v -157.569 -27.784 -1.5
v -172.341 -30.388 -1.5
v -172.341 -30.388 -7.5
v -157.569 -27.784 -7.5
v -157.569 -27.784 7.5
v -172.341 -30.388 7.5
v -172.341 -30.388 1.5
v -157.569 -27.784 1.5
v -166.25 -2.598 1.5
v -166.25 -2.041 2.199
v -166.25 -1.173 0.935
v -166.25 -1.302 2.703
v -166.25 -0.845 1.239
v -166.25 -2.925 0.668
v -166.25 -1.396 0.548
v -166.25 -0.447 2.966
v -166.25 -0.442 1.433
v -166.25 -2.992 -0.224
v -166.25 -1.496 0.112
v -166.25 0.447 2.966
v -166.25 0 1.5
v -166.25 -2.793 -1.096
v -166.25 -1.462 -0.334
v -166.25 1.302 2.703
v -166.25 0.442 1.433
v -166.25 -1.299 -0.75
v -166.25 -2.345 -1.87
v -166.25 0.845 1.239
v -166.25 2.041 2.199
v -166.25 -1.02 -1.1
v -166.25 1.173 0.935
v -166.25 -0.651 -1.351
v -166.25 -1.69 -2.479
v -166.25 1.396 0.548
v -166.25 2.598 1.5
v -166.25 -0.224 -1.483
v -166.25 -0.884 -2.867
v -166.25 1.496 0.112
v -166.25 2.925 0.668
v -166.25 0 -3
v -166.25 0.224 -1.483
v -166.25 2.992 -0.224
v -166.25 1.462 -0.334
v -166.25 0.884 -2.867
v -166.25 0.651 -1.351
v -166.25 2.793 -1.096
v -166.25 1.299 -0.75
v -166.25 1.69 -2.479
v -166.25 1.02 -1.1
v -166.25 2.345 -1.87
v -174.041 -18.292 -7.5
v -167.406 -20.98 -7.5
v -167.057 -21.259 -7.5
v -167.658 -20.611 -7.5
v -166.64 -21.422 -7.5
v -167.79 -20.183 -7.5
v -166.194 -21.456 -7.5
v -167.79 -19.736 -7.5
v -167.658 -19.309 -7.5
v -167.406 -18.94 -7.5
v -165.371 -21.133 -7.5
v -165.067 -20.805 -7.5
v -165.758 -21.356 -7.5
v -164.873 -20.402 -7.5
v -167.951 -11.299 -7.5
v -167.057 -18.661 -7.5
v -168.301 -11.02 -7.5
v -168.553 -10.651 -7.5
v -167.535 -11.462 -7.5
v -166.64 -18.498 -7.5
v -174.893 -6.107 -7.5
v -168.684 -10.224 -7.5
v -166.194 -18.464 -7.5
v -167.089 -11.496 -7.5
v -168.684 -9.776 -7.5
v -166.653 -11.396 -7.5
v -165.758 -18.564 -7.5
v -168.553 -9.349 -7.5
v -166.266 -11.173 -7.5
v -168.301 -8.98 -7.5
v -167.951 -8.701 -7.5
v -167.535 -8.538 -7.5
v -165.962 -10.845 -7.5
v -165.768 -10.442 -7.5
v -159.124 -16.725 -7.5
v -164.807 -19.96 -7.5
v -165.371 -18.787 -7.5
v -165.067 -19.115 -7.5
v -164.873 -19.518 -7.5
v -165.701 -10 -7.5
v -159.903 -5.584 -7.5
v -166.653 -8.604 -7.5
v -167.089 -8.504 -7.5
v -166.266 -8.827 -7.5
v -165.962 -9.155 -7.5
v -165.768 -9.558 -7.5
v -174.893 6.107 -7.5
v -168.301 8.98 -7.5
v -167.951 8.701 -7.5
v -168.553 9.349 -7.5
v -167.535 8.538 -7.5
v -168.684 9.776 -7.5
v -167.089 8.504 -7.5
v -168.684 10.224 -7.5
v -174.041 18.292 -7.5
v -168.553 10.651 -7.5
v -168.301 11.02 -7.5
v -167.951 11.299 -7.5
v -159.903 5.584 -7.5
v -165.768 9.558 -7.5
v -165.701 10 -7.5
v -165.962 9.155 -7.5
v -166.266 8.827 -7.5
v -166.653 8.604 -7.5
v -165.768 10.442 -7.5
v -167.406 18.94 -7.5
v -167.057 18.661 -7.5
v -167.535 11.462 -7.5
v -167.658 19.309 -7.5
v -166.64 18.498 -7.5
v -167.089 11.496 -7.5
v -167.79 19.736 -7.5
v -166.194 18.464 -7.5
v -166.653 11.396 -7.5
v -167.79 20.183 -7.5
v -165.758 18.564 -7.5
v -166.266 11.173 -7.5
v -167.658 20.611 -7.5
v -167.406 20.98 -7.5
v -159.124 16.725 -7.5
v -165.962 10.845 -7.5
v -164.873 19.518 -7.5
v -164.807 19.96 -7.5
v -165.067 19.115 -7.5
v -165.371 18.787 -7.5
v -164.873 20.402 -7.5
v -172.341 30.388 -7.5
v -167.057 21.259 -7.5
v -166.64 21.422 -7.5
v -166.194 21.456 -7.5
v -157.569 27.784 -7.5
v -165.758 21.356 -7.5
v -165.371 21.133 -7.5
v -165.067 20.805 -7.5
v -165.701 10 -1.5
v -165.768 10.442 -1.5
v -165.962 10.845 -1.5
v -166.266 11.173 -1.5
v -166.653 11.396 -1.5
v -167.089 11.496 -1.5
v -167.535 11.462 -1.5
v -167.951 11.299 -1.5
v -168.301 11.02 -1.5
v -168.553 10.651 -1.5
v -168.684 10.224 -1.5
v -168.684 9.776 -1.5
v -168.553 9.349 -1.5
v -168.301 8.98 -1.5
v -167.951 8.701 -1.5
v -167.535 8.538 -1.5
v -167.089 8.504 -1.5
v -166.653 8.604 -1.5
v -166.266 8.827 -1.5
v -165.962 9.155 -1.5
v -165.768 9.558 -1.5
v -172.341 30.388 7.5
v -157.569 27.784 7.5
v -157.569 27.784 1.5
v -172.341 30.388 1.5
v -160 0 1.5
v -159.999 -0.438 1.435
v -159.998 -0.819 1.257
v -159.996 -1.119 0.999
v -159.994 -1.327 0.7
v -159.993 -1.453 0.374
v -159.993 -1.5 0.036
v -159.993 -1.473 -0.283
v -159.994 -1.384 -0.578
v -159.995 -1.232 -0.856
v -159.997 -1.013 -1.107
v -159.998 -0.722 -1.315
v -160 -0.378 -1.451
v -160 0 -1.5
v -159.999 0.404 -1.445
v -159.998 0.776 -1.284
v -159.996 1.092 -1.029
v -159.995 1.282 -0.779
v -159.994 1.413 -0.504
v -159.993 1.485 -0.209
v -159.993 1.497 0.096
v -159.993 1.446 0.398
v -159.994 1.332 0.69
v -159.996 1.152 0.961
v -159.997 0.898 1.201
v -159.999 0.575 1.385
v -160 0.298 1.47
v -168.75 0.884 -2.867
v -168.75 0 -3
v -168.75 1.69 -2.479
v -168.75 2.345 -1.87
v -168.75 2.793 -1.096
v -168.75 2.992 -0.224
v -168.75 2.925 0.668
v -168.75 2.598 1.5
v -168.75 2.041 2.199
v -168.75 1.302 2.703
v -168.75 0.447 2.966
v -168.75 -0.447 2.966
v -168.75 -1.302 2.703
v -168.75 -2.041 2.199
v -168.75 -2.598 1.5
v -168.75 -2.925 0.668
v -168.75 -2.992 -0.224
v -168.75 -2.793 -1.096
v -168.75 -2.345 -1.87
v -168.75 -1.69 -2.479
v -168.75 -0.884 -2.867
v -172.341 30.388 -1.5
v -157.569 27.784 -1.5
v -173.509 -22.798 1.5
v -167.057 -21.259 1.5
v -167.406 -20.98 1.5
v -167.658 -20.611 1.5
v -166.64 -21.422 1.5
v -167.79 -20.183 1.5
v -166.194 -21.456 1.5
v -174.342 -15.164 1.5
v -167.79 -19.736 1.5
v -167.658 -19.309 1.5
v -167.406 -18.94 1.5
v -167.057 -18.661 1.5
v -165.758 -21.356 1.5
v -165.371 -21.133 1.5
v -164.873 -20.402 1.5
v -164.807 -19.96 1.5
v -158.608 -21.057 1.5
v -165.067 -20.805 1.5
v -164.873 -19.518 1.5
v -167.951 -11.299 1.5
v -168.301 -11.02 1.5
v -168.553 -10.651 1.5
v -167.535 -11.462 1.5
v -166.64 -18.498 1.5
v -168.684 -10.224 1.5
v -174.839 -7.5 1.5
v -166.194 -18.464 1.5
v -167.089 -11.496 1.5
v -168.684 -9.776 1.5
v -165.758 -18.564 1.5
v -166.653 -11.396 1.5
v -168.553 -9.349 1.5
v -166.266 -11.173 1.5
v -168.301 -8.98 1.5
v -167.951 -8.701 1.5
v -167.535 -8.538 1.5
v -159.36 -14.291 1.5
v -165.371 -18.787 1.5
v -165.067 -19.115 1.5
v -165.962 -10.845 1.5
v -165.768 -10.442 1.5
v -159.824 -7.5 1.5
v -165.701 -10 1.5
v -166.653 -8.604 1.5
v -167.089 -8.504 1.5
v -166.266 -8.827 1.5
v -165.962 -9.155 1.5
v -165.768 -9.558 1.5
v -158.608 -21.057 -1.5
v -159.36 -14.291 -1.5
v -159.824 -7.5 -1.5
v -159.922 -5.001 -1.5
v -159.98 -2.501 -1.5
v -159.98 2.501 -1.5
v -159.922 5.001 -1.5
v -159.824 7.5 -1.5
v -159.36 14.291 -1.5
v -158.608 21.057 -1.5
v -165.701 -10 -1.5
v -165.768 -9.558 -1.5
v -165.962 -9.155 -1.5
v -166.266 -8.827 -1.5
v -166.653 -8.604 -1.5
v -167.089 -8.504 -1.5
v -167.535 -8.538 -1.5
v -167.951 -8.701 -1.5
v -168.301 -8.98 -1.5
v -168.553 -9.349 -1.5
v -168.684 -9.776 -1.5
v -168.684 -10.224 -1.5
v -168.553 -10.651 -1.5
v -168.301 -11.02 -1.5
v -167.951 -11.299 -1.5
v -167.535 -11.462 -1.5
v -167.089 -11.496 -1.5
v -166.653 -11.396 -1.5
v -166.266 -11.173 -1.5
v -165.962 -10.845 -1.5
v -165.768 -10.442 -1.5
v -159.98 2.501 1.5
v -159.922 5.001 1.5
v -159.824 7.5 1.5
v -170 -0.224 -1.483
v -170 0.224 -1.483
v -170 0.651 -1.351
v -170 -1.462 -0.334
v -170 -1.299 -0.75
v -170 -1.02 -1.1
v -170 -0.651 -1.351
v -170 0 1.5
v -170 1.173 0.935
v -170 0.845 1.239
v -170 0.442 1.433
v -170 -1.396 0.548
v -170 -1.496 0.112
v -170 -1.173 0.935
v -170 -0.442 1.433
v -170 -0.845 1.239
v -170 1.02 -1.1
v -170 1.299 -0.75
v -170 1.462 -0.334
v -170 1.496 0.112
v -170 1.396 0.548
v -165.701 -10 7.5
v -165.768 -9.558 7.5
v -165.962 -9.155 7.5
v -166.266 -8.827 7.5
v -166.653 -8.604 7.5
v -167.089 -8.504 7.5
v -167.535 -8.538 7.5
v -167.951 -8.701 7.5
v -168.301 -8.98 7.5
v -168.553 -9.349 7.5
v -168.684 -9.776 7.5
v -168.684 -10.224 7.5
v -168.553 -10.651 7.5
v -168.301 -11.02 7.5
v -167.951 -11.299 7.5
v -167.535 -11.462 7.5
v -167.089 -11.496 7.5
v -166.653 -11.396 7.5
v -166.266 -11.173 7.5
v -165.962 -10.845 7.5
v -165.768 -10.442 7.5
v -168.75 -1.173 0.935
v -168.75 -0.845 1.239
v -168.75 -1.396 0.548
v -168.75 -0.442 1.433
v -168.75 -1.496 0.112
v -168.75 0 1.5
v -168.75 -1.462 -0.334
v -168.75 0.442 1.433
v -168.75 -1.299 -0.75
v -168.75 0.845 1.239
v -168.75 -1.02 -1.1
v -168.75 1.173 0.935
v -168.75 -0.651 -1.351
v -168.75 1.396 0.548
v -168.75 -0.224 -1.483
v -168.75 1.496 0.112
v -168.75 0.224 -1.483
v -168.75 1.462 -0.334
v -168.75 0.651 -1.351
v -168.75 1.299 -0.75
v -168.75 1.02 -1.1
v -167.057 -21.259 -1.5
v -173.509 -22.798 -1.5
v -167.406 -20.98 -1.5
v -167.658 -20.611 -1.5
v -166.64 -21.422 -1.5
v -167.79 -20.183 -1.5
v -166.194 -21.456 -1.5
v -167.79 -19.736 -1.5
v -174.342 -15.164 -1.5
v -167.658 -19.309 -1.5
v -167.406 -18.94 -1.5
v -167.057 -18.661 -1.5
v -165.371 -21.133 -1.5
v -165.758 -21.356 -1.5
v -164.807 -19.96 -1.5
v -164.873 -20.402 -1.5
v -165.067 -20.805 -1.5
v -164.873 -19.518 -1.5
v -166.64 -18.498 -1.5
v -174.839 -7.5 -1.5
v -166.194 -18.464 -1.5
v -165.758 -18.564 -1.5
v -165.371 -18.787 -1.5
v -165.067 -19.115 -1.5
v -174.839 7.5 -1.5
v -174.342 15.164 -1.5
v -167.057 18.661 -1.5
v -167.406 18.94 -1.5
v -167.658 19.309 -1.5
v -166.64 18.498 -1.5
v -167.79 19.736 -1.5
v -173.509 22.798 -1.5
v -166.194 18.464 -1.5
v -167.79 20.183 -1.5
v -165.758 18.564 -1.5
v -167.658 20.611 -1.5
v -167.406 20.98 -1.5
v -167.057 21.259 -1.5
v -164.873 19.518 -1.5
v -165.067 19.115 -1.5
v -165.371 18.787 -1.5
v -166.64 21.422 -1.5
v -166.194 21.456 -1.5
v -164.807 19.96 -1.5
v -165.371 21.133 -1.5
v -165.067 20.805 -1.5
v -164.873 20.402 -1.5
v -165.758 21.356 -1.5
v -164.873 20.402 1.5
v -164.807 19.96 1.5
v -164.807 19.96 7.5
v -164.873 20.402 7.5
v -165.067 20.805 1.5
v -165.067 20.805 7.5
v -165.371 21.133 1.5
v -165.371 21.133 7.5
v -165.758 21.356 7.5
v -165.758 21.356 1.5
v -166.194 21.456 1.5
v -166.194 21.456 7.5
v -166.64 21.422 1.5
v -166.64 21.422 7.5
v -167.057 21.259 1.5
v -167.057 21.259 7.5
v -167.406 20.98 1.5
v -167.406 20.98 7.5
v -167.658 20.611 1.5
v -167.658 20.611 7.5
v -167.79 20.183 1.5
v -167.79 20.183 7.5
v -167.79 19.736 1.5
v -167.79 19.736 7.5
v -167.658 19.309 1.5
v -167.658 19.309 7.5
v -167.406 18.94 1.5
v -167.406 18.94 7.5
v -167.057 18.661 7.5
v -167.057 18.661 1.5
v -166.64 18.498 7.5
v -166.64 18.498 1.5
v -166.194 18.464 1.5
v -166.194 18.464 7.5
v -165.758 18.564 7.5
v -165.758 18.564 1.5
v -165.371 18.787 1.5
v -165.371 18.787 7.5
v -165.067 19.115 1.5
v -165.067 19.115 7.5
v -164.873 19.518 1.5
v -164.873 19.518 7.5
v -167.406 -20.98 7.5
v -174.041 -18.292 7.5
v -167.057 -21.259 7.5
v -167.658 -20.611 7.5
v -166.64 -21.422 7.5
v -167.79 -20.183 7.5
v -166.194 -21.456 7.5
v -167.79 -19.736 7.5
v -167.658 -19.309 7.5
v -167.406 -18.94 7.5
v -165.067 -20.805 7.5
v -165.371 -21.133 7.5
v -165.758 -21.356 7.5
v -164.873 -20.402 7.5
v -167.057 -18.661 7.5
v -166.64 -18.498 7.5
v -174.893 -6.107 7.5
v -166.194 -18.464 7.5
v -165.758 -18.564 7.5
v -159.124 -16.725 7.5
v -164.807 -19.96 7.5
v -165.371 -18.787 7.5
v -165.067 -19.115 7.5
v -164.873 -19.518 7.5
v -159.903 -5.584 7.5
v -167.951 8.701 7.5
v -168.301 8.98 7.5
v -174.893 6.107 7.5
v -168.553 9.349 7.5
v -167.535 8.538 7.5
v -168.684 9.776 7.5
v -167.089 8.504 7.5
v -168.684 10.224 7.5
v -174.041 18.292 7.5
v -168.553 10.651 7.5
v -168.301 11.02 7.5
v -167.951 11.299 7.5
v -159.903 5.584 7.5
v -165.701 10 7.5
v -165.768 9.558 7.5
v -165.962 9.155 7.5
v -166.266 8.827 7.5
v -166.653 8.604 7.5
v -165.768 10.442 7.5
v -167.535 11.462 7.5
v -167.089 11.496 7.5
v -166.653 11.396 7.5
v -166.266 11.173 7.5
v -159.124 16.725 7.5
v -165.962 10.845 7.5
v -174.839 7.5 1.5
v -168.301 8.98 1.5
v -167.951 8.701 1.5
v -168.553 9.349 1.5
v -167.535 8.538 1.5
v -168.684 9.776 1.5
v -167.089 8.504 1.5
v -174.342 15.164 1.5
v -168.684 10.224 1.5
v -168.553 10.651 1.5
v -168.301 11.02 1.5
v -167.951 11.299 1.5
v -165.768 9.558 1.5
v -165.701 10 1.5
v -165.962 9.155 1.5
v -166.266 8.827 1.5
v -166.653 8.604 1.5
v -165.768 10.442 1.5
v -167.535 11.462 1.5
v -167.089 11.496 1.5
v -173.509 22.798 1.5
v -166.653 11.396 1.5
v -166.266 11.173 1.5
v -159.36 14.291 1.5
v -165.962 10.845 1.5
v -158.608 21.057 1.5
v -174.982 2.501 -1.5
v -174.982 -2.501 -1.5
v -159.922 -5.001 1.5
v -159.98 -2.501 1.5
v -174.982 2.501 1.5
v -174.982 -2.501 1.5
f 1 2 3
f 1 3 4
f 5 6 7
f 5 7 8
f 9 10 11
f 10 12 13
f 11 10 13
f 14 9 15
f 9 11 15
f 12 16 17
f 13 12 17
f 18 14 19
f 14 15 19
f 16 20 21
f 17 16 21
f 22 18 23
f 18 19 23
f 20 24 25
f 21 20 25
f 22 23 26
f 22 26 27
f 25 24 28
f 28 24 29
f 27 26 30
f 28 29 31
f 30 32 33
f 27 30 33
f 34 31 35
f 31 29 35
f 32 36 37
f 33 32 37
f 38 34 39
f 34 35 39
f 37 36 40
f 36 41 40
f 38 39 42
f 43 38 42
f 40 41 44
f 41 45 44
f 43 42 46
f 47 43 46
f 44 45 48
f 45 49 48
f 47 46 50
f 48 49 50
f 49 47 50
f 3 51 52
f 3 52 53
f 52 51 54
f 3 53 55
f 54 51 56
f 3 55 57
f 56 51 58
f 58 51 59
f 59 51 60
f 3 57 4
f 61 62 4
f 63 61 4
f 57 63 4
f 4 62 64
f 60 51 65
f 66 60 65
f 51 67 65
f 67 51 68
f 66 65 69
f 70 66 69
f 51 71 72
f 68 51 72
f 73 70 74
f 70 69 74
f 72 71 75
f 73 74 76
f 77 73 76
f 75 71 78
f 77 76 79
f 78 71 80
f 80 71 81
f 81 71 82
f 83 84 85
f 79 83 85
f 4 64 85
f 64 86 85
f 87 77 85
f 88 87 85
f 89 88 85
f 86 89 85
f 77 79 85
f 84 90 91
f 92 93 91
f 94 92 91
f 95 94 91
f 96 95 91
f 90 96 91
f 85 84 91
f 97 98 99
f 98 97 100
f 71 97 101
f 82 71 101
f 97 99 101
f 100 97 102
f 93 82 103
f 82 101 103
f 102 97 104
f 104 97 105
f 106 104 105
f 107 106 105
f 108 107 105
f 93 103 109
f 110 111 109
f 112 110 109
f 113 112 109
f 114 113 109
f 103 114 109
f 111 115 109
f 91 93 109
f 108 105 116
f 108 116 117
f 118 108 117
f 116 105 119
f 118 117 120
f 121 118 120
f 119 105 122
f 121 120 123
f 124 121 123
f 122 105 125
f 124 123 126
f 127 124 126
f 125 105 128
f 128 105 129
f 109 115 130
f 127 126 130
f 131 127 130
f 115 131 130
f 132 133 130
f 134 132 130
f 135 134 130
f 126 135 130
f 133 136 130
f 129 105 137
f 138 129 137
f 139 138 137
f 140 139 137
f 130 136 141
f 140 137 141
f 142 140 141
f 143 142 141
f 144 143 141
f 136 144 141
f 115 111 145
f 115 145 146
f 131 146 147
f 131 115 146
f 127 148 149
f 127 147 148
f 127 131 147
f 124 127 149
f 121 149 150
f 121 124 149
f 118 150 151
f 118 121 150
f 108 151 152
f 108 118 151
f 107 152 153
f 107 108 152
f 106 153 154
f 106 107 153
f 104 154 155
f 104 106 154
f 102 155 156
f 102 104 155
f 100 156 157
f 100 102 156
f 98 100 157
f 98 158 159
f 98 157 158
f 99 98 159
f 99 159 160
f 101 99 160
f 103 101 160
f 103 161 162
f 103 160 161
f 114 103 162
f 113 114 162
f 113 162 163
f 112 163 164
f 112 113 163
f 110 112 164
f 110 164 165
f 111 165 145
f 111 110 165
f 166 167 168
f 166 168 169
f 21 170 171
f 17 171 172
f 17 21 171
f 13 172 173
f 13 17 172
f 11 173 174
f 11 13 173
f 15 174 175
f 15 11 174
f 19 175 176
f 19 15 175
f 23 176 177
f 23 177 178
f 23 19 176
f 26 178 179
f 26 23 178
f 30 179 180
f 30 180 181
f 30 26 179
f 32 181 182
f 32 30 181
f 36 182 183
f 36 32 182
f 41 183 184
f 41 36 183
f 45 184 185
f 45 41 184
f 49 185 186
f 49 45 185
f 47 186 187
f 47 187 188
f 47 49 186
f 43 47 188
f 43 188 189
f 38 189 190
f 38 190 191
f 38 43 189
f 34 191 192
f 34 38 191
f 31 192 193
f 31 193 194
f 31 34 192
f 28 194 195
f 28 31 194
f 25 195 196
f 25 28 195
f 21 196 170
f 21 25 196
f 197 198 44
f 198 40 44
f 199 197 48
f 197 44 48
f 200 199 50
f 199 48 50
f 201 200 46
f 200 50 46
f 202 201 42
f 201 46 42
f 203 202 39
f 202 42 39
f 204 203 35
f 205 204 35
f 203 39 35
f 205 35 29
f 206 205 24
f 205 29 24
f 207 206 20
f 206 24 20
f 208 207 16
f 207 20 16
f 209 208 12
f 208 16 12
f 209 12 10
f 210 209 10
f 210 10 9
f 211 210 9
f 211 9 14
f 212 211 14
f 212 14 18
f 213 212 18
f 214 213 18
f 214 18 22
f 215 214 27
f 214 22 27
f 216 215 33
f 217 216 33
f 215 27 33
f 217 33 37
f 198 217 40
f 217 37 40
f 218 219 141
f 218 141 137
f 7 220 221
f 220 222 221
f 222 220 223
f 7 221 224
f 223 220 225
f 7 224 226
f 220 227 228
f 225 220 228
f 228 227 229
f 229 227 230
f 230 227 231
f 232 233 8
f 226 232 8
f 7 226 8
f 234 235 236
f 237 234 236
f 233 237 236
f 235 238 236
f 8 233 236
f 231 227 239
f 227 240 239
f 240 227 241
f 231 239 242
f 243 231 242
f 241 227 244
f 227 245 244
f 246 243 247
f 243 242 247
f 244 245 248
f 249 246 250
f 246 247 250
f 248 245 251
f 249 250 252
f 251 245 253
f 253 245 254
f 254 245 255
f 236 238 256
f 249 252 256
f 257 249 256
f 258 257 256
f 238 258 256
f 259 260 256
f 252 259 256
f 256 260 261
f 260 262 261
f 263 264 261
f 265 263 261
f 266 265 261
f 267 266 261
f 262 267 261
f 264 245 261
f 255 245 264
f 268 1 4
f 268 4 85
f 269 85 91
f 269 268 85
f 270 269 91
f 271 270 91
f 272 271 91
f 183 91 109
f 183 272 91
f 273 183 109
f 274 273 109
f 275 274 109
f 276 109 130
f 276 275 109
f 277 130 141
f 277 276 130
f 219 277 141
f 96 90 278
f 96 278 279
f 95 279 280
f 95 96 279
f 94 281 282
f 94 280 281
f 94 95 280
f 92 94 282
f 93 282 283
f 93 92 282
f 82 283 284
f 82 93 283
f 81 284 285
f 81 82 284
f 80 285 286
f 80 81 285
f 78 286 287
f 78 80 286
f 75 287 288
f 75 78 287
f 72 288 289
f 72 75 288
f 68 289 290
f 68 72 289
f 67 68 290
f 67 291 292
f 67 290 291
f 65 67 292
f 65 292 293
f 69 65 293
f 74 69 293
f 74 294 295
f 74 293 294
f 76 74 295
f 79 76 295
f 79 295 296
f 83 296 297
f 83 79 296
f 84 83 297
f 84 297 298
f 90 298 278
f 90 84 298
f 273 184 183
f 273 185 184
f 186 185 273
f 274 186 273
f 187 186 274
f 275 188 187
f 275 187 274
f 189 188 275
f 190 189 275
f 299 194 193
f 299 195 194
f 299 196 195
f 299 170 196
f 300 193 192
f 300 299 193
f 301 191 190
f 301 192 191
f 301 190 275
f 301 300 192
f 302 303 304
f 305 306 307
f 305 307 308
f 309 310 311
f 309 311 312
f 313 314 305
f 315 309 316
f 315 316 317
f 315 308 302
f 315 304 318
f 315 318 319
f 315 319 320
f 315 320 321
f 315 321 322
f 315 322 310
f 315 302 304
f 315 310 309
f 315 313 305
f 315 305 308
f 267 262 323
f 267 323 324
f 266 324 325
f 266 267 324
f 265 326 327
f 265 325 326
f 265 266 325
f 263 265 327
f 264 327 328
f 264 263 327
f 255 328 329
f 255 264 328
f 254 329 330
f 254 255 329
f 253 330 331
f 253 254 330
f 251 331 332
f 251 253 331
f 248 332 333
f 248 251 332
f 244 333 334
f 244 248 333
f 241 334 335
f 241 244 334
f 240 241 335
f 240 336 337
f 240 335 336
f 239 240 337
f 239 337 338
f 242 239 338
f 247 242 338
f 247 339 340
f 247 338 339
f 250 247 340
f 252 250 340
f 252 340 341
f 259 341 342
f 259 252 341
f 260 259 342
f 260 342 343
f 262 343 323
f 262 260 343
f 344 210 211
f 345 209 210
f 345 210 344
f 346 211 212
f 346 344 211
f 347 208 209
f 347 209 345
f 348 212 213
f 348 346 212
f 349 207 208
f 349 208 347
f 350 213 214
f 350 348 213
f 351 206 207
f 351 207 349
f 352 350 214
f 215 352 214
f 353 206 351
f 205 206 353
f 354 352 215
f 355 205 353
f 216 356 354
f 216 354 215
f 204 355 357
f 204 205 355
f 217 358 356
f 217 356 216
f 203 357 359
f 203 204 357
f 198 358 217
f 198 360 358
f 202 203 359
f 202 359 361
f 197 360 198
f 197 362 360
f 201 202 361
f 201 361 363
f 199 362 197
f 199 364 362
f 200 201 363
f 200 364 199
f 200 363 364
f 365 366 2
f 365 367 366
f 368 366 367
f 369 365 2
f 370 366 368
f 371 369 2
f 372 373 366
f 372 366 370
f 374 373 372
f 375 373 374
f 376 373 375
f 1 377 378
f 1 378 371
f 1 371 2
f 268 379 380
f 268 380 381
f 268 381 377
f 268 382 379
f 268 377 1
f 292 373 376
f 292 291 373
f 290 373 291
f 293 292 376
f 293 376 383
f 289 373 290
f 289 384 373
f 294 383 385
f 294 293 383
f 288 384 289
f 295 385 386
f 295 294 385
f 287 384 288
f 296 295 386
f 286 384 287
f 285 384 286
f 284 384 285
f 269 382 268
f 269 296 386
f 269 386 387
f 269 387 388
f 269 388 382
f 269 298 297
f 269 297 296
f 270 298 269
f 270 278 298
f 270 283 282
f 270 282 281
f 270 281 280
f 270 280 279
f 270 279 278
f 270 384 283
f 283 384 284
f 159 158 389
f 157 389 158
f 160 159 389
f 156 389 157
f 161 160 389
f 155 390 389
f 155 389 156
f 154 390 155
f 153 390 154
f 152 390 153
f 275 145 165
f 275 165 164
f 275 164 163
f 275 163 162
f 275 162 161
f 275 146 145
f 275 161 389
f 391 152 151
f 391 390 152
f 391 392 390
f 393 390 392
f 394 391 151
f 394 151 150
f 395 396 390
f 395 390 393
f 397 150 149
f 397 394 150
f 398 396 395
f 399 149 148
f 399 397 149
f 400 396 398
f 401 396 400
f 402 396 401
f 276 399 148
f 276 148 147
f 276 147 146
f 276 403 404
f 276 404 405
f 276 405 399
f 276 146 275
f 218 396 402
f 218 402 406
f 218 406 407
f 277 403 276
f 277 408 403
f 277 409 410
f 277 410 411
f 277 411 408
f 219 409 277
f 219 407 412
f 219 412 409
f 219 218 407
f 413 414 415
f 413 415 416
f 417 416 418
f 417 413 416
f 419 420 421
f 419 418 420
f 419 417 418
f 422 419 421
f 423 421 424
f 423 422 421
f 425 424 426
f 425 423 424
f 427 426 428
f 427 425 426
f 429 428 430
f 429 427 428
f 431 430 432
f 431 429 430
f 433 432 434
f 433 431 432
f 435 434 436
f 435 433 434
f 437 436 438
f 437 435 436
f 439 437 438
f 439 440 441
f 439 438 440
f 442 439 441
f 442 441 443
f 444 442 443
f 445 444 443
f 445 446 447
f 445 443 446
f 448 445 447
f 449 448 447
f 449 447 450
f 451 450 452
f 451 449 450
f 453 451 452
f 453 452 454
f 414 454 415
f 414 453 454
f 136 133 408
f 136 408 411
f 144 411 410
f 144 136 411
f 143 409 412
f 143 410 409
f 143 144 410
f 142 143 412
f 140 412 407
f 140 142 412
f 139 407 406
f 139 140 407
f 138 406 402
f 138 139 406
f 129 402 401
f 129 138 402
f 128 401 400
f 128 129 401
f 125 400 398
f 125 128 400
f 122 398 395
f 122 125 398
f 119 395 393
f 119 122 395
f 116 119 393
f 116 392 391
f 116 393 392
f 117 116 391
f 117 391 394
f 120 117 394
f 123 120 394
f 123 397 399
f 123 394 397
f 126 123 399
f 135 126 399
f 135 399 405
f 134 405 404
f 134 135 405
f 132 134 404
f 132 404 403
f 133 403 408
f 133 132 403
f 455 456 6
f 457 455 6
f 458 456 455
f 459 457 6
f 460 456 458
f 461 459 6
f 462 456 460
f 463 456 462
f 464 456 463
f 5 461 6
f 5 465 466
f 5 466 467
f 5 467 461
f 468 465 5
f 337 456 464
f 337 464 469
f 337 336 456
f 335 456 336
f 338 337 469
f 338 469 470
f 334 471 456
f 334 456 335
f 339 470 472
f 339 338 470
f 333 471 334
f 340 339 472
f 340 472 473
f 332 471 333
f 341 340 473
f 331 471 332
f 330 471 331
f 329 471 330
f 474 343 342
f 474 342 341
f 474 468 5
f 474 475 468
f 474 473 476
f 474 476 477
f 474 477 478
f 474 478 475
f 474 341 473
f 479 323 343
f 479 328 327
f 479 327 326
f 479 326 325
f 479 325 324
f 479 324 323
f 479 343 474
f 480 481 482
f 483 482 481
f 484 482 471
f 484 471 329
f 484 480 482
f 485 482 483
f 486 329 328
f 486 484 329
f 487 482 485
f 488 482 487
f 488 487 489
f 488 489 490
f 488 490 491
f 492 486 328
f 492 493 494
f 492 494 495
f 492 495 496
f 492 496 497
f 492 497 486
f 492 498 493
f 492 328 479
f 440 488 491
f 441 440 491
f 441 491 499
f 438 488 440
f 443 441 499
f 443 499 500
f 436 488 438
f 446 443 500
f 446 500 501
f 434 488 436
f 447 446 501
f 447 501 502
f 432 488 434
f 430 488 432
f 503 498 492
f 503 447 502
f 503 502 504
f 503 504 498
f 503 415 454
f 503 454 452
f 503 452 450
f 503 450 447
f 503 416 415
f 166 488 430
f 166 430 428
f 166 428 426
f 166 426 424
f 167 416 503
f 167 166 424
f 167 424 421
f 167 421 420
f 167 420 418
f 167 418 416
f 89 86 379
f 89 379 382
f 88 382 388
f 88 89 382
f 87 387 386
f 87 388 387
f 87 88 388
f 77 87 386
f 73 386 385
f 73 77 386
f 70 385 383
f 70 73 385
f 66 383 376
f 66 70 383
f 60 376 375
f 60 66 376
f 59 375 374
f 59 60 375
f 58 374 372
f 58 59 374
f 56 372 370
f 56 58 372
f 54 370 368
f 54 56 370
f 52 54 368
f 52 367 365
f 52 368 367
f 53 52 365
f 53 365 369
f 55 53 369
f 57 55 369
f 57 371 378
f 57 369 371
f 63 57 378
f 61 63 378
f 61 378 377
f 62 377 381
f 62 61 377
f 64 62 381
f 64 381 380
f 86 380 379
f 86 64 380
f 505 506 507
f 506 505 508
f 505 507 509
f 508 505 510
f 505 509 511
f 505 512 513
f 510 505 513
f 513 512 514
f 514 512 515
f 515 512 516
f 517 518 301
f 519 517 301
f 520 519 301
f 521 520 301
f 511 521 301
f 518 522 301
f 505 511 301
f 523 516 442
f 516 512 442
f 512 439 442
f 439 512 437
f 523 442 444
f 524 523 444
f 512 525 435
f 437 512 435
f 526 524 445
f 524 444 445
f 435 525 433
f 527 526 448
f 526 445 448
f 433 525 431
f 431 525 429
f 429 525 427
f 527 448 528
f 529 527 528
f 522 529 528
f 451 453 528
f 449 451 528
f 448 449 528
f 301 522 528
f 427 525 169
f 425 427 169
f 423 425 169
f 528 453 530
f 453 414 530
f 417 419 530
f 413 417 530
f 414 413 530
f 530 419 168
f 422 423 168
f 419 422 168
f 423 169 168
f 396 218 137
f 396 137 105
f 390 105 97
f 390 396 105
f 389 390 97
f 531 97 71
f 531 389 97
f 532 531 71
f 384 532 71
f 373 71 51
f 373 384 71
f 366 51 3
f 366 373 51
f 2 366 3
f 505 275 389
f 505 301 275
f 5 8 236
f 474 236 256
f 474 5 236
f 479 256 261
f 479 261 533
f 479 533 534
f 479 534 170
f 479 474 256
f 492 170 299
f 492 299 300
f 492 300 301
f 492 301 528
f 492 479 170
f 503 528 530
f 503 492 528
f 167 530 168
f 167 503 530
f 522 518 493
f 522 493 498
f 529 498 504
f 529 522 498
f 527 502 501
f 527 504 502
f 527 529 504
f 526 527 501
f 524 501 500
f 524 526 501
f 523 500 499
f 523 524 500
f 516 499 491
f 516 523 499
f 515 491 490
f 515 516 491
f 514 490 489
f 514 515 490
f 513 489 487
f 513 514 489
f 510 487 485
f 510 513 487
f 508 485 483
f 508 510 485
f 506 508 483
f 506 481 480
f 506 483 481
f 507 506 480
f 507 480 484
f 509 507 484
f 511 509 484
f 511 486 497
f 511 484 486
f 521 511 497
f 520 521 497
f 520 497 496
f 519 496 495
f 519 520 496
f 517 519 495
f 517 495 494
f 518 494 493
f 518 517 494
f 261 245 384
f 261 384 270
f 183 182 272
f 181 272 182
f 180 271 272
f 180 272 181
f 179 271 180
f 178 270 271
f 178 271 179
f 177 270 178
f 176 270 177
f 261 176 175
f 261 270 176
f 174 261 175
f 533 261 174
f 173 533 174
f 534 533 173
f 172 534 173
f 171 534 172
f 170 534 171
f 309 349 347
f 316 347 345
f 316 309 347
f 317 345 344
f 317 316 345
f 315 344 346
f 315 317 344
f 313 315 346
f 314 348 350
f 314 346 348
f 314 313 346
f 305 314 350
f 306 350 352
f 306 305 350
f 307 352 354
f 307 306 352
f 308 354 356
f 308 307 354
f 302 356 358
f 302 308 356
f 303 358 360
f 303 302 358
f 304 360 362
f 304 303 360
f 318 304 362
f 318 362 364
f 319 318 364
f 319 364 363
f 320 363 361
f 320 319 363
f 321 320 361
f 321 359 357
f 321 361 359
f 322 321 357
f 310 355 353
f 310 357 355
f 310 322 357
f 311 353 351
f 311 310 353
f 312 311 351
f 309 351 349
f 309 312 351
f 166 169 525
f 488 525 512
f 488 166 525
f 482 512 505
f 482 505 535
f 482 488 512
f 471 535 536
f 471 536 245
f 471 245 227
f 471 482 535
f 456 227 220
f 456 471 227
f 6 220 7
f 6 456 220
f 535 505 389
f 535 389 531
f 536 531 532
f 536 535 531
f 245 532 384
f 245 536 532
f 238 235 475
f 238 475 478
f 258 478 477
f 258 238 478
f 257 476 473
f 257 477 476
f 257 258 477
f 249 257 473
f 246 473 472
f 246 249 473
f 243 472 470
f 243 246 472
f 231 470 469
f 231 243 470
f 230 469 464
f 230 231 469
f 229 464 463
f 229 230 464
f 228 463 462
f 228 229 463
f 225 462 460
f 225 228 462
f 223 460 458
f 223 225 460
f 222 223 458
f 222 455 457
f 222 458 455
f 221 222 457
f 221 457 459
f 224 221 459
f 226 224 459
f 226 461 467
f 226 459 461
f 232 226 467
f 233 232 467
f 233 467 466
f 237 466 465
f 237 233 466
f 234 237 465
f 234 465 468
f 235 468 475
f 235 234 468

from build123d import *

# Parameters (mm, degrees)
BOSS_EXTRUDE3_DEPTH     = 7.5
CUT_EXTRUDE4_DEPTH      = 1.5
BOSS_EXTRUDE5_DEPTH     = 1.5
SKETCH4_R               = 3
BEARING_HOLE_DEPTH      = 1.25
SHAFT_HOLE_DEPTH        = 33.837885572
SHAFT_HOLE_DEPTH_BACK   = 2.5
SKETCH7_R               = 1.5
CUT_EXTRUDE6_DEPTH      = 178.77712661
CUT_EXTRUDE6_DEPTH_BACK = 178.77712661
SKETCH8_R               = 1.5


with BuildPart() as part:
    # Sketch1 → Boss-Extrude3 (new, symmetric)
    with BuildSketch(Plane.XY):
        with BuildLine():
            ThreePointArc((-157.569240482, -27.783708427), (-160, 0), (-157.569240482, 27.783708427))
            Line((-157.569240482, 27.783708427), (-172.341356777, 30.388431092))
            ThreePointArc((-172.341356777, 30.388431092), (-175, 0), (-172.341356777, -30.388431092))
            Line((-172.341356777, -30.388431092), (-157.569240482, -27.783708427))
        make_face()
    extrude(amount=BOSS_EXTRUDE3_DEPTH, both=True)

    # Sketch1<6> → Cut-Extrude4 (cut, symmetric)
    with BuildSketch(Plane.XY):
        with BuildLine():
            Line((-157.569240482, 27.783708427), (-172.341356777, 30.388431092))
            ThreePointArc((-172.341356777, 30.388431092), (-175, 0), (-172.341356777, -30.388431092))
            Line((-172.341356777, -30.388431092), (-157.569240482, -27.783708427))
            ThreePointArc((-157.569240482, -27.783708427), (-160, 0), (-157.569240482, 27.783708427))
        make_face()
    extrude(amount=CUT_EXTRUDE4_DEPTH, both=True, mode=Mode.SUBTRACT)


with BuildPart() as cut_extrude4_piece_1:
    # of the separate pieces the step leaves, piece 1, a body of its own (cut_extrude4_pieces)
    add(part.part.solids().sort_by_distance((-157.569240482, -27.783708427, -1.5))[0])



with BuildPart() as cut_extrude4_piece_2:
    # of the separate pieces the step leaves, piece 2, a body of its own (cut_extrude4_pieces)
    add(part.part.solids().sort_by_distance((-157.569240482, -27.783708427, 7.5))[0])


with BuildPart() as cut_extrude4_piece_1_1:
    add(cut_extrude4_piece_1.part)

    add(cut_extrude4_piece_2.part)  # Boss-Extrude5 merges Cut-Extrude4 piece 2
    # Sketch6 → Boss-Extrude5 (add, symmetric)
    with BuildSketch(Plane.XY):
        with BuildLine():
            Line((-159.824122084, 7.5), (-174.839211849, 7.5))
            ThreePointArc((-174.839211849, 7.5), (-175, 0), (-174.839211849, -7.5))
            Line((-174.839211849, -7.5), (-159.824122084, -7.5))
            ThreePointArc((-159.824122084, -7.5), (-160, 0), (-159.824122084, 7.5))
        make_face()
    extrude(amount=BOSS_EXTRUDE5_DEPTH, both=True)

    # Sketch4 → bearing hole (cut, symmetric)
    with BuildSketch(Plane(origin=(-167.5, 0, 0), x_dir=(0, 0, -1), z_dir=(1, 0, 0))):
        Circle(SKETCH4_R)
    extrude(amount=BEARING_HOLE_DEPTH, both=True, mode=Mode.SUBTRACT)

    # Sketch7 → shaft hole (cut, two sides: drawn at the far end of the back side and taken through both)
    with BuildSketch(Plane(origin=(-167.5, 0, 0), x_dir=(0, 0, -1), z_dir=(1, 0, 0)).offset(-SHAFT_HOLE_DEPTH_BACK)):
        Circle(SKETCH7_R)
    extrude(amount=SHAFT_HOLE_DEPTH + SHAFT_HOLE_DEPTH_BACK, mode=Mode.SUBTRACT)

    # Sketch8 → Cut-Extrude6 (cut, two sides: drawn at the far end of the back side and taken through both)
    with BuildSketch(Plane.XY.offset(-CUT_EXTRUDE6_DEPTH_BACK)):
        with Locations((-166.306502189, 19.95989303)):
            Circle(SKETCH8_R)
        with Locations((-167.201226072, 10)):
            Circle(SKETCH8_R)
        with Locations((-167.201226072, -10)):
            Circle(SKETCH8_R)
        with Locations((-166.306502189, -19.95989303)):
            Circle(SKETCH8_R)
    extrude(amount=CUT_EXTRUDE6_DEPTH + CUT_EXTRUDE6_DEPTH_BACK, mode=Mode.SUBTRACT)


solid = cut_extrude4_piece_1_1.part
